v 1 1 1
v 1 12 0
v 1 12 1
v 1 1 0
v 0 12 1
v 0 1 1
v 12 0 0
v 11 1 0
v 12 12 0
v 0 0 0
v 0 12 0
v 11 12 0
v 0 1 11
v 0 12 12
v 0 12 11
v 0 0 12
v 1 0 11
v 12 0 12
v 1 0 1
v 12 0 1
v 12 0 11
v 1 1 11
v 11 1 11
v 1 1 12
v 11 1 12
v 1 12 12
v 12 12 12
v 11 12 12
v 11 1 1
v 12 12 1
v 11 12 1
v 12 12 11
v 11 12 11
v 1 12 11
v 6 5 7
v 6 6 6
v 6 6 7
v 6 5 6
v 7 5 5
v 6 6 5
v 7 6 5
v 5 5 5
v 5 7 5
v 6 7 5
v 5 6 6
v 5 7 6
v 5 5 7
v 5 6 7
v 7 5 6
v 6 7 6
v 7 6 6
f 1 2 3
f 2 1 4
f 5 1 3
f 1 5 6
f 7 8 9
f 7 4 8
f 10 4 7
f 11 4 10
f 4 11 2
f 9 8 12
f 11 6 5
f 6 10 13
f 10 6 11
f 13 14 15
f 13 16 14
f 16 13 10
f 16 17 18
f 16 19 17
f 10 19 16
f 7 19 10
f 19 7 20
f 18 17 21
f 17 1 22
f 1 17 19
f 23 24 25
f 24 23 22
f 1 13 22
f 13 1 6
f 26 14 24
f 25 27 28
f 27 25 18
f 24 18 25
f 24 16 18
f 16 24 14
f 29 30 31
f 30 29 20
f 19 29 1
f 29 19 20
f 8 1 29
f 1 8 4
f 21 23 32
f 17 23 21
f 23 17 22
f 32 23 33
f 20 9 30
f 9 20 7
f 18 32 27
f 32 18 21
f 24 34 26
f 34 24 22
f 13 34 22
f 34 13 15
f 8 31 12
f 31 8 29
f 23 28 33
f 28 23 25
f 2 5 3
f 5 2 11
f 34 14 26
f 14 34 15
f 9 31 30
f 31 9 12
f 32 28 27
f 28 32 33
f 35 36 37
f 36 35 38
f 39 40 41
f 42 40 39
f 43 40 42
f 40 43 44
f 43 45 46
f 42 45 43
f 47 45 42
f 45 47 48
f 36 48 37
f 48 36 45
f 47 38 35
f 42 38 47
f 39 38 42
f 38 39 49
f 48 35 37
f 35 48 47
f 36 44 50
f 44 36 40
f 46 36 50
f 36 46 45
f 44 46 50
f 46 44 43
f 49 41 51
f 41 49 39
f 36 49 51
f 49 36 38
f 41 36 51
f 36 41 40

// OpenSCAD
union() {
    translate([0.0, 0.0, 0.0]) cube([1, 1, 1]);
    translate([0.0, 0.0, 1.0]) cube([1, 1, 1]);
    translate([0.0, 0.0, 2.0]) cube([1, 1, 1]);
    translate([0.0, 0.0, 3.0]) cube([1, 1, 1]);
    translate([0.0, 0.0, 4.0]) cube([1, 1, 1]);
    translate([0.0, 0.0, 5.0]) cube([1, 1, 1]);
    translate([0.0, 0.0, 6.0]) cube([1, 1, 1]);
    translate([0.0, 0.0, 7.0]) cube([1, 1, 1]);
    translate([0.0, 0.0, 8.0]) cube([1, 1, 1]);
    translate([0.0, 0.0, 9.0]) cube([1, 1, 1]);
    translate([0.0, 0.0, 10.0]) cube([1, 1, 1]);
    translate([0.0, 0.0, 11.0]) cube([1, 1, 1]);
    translate([1.0, 0.0, 0.0]) cube([1, 1, 1]);
    translate([1.0, 0.0, 11.0]) cube([1, 1, 1]);
    translate([2.0, 0.0, 0.0]) cube([1, 1, 1]);
    translate([2.0, 0.0, 11.0]) cube([1, 1, 1]);
    translate([3.0, 0.0, 0.0]) cube([1, 1, 1]);
    translate([3.0, 0.0, 11.0]) cube([1, 1, 1]);
    translate([4.0, 0.0, 0.0]) cube([1, 1, 1]);
    translate([4.0, 0.0, 11.0]) cube([1, 1, 1]);
    translate([5.0, 0.0, 0.0]) cube([1, 1, 1]);
    translate([5.0, 0.0, 11.0]) cube([1, 1, 1]);
    translate([6.0, 0.0, 0.0]) cube([1, 1, 1]);
    translate([6.0, 0.0, 11.0]) cube([1, 1, 1]);
    translate([7.0, 0.0, 0.0]) cube([1, 1, 1]);
    translate([7.0, 0.0, 11.0]) cube([1, 1, 1]);
    translate([8.0, 0.0, 0.0]) cube([1, 1, 1]);
    translate([8.0, 0.0, 11.0]) cube([1, 1, 1]);
    translate([9.0, 0.0, 0.0]) cube([1, 1, 1]);
    translate([9.0, 0.0, 11.0]) cube([1, 1, 1]);
    translate([10.0, 0.0, 0.0]) cube([1, 1, 1]);
    translate([10.0, 0.0, 11.0]) cube([1, 1, 1]);
    translate([11.0, 0.0, 0.0]) cube([1, 1, 1]);
    translate([11.0, 0.0, 11.0]) cube([1, 1, 1]);
    translate([0.0, 1.0, 0.0]) cube([1, 1, 1]);
    translate([0.0, 1.0, 11.0]) cube([1, 1, 1]);
    translate([11.0, 1.0, 0.0]) cube([1, 1, 1]);
    translate([11.0, 1.0, 11.0]) cube([1, 1, 1]);
    translate([0.0, 2.0, 0.0]) cube([1, 1, 1]);
    translate([0.0, 2.0, 11.0]) cube([1, 1, 1]);
    translate([11.0, 2.0, 0.0]) cube([1, 1, 1]);
    translate([11.0, 2.0, 11.0]) cube([1, 1, 1]);
    translate([0.0, 3.0, 0.0]) cube([1, 1, 1]);
    translate([0.0, 3.0, 11.0]) cube([1, 1, 1]);
    translate([11.0, 3.0, 0.0]) cube([1, 1, 1]);
    translate([11.0, 3.0, 11.0]) cube([1, 1, 1]);
    translate([0.0, 4.0, 0.0]) cube([1, 1, 1]);
    translate([0.0, 4.0, 11.0]) cube([1, 1, 1]);
    translate([11.0, 4.0, 0.0]) cube([1, 1, 1]);
    translate([11.0, 4.0, 11.0]) cube([1, 1, 1]);
    translate([0.0, 5.0, 0.0]) cube([1, 1, 1]);
    translate([0.0, 5.0, 11.0]) cube([1, 1, 1]);
    translate([11.0, 5.0, 0.0]) cube([1, 1, 1]);
    translate([11.0, 5.0, 11.0]) cube([1, 1, 1]);
    translate([0.0, 6.0, 0.0]) cube([1, 1, 1]);
    translate([0.0, 6.0, 11.0]) cube([1, 1, 1]);
    translate([11.0, 6.0, 0.0]) cube([1, 1, 1]);
    translate([11.0, 6.0, 11.0]) cube([1, 1, 1]);
    translate([0.0, 7.0, 0.0]) cube([1, 1, 1]);
    translate([0.0, 7.0, 11.0]) cube([1, 1, 1]);
    translate([11.0, 7.0, 0.0]) cube([1, 1, 1]);
    translate([11.0, 7.0, 11.0]) cube([1, 1, 1]);
    translate([0.0, 8.0, 0.0]) cube([1, 1, 1]);
    translate([0.0, 8.0, 11.0]) cube([1, 1, 1]);
    translate([11.0, 8.0, 0.0]) cube([1, 1, 1]);
    translate([11.0, 8.0, 11.0]) cube([1, 1, 1]);
    translate([0.0, 9.0, 0.0]) cube([1, 1, 1]);
    translate([0.0, 9.0, 11.0]) cube([1, 1, 1]);
    translate([11.0, 9.0, 0.0]) cube([1, 1, 1]);
    translate([11.0, 9.0, 11.0]) cube([1, 1, 1]);
    translate([0.0, 10.0, 0.0]) cube([1, 1, 1]);
    translate([0.0, 10.0, 11.0]) cube([1, 1, 1]);
    translate([11.0, 10.0, 0.0]) cube([1, 1, 1]);
    translate([11.0, 10.0, 11.0]) cube([1, 1, 1]);
    translate([0.0, 11.0, 0.0]) cube([1, 1, 1]);
    translate([0.0, 11.0, 11.0]) cube([1, 1, 1]);
    translate([11.0, 11.0, 0.0]) cube([1, 1, 1]);
    translate([11.0, 11.0, 11.0]) cube([1, 1, 1]);
    translate([5.0, 5.0, 5.0]) cube([1, 1, 1]);
    translate([5.0, 5.0, 6.0]) cube([1, 1, 1]);
    translate([5.0, 6.0, 5.0]) cube([1, 1, 1]);
    translate([6.0, 5.0, 5.0]) cube([1, 1, 1]);
}
